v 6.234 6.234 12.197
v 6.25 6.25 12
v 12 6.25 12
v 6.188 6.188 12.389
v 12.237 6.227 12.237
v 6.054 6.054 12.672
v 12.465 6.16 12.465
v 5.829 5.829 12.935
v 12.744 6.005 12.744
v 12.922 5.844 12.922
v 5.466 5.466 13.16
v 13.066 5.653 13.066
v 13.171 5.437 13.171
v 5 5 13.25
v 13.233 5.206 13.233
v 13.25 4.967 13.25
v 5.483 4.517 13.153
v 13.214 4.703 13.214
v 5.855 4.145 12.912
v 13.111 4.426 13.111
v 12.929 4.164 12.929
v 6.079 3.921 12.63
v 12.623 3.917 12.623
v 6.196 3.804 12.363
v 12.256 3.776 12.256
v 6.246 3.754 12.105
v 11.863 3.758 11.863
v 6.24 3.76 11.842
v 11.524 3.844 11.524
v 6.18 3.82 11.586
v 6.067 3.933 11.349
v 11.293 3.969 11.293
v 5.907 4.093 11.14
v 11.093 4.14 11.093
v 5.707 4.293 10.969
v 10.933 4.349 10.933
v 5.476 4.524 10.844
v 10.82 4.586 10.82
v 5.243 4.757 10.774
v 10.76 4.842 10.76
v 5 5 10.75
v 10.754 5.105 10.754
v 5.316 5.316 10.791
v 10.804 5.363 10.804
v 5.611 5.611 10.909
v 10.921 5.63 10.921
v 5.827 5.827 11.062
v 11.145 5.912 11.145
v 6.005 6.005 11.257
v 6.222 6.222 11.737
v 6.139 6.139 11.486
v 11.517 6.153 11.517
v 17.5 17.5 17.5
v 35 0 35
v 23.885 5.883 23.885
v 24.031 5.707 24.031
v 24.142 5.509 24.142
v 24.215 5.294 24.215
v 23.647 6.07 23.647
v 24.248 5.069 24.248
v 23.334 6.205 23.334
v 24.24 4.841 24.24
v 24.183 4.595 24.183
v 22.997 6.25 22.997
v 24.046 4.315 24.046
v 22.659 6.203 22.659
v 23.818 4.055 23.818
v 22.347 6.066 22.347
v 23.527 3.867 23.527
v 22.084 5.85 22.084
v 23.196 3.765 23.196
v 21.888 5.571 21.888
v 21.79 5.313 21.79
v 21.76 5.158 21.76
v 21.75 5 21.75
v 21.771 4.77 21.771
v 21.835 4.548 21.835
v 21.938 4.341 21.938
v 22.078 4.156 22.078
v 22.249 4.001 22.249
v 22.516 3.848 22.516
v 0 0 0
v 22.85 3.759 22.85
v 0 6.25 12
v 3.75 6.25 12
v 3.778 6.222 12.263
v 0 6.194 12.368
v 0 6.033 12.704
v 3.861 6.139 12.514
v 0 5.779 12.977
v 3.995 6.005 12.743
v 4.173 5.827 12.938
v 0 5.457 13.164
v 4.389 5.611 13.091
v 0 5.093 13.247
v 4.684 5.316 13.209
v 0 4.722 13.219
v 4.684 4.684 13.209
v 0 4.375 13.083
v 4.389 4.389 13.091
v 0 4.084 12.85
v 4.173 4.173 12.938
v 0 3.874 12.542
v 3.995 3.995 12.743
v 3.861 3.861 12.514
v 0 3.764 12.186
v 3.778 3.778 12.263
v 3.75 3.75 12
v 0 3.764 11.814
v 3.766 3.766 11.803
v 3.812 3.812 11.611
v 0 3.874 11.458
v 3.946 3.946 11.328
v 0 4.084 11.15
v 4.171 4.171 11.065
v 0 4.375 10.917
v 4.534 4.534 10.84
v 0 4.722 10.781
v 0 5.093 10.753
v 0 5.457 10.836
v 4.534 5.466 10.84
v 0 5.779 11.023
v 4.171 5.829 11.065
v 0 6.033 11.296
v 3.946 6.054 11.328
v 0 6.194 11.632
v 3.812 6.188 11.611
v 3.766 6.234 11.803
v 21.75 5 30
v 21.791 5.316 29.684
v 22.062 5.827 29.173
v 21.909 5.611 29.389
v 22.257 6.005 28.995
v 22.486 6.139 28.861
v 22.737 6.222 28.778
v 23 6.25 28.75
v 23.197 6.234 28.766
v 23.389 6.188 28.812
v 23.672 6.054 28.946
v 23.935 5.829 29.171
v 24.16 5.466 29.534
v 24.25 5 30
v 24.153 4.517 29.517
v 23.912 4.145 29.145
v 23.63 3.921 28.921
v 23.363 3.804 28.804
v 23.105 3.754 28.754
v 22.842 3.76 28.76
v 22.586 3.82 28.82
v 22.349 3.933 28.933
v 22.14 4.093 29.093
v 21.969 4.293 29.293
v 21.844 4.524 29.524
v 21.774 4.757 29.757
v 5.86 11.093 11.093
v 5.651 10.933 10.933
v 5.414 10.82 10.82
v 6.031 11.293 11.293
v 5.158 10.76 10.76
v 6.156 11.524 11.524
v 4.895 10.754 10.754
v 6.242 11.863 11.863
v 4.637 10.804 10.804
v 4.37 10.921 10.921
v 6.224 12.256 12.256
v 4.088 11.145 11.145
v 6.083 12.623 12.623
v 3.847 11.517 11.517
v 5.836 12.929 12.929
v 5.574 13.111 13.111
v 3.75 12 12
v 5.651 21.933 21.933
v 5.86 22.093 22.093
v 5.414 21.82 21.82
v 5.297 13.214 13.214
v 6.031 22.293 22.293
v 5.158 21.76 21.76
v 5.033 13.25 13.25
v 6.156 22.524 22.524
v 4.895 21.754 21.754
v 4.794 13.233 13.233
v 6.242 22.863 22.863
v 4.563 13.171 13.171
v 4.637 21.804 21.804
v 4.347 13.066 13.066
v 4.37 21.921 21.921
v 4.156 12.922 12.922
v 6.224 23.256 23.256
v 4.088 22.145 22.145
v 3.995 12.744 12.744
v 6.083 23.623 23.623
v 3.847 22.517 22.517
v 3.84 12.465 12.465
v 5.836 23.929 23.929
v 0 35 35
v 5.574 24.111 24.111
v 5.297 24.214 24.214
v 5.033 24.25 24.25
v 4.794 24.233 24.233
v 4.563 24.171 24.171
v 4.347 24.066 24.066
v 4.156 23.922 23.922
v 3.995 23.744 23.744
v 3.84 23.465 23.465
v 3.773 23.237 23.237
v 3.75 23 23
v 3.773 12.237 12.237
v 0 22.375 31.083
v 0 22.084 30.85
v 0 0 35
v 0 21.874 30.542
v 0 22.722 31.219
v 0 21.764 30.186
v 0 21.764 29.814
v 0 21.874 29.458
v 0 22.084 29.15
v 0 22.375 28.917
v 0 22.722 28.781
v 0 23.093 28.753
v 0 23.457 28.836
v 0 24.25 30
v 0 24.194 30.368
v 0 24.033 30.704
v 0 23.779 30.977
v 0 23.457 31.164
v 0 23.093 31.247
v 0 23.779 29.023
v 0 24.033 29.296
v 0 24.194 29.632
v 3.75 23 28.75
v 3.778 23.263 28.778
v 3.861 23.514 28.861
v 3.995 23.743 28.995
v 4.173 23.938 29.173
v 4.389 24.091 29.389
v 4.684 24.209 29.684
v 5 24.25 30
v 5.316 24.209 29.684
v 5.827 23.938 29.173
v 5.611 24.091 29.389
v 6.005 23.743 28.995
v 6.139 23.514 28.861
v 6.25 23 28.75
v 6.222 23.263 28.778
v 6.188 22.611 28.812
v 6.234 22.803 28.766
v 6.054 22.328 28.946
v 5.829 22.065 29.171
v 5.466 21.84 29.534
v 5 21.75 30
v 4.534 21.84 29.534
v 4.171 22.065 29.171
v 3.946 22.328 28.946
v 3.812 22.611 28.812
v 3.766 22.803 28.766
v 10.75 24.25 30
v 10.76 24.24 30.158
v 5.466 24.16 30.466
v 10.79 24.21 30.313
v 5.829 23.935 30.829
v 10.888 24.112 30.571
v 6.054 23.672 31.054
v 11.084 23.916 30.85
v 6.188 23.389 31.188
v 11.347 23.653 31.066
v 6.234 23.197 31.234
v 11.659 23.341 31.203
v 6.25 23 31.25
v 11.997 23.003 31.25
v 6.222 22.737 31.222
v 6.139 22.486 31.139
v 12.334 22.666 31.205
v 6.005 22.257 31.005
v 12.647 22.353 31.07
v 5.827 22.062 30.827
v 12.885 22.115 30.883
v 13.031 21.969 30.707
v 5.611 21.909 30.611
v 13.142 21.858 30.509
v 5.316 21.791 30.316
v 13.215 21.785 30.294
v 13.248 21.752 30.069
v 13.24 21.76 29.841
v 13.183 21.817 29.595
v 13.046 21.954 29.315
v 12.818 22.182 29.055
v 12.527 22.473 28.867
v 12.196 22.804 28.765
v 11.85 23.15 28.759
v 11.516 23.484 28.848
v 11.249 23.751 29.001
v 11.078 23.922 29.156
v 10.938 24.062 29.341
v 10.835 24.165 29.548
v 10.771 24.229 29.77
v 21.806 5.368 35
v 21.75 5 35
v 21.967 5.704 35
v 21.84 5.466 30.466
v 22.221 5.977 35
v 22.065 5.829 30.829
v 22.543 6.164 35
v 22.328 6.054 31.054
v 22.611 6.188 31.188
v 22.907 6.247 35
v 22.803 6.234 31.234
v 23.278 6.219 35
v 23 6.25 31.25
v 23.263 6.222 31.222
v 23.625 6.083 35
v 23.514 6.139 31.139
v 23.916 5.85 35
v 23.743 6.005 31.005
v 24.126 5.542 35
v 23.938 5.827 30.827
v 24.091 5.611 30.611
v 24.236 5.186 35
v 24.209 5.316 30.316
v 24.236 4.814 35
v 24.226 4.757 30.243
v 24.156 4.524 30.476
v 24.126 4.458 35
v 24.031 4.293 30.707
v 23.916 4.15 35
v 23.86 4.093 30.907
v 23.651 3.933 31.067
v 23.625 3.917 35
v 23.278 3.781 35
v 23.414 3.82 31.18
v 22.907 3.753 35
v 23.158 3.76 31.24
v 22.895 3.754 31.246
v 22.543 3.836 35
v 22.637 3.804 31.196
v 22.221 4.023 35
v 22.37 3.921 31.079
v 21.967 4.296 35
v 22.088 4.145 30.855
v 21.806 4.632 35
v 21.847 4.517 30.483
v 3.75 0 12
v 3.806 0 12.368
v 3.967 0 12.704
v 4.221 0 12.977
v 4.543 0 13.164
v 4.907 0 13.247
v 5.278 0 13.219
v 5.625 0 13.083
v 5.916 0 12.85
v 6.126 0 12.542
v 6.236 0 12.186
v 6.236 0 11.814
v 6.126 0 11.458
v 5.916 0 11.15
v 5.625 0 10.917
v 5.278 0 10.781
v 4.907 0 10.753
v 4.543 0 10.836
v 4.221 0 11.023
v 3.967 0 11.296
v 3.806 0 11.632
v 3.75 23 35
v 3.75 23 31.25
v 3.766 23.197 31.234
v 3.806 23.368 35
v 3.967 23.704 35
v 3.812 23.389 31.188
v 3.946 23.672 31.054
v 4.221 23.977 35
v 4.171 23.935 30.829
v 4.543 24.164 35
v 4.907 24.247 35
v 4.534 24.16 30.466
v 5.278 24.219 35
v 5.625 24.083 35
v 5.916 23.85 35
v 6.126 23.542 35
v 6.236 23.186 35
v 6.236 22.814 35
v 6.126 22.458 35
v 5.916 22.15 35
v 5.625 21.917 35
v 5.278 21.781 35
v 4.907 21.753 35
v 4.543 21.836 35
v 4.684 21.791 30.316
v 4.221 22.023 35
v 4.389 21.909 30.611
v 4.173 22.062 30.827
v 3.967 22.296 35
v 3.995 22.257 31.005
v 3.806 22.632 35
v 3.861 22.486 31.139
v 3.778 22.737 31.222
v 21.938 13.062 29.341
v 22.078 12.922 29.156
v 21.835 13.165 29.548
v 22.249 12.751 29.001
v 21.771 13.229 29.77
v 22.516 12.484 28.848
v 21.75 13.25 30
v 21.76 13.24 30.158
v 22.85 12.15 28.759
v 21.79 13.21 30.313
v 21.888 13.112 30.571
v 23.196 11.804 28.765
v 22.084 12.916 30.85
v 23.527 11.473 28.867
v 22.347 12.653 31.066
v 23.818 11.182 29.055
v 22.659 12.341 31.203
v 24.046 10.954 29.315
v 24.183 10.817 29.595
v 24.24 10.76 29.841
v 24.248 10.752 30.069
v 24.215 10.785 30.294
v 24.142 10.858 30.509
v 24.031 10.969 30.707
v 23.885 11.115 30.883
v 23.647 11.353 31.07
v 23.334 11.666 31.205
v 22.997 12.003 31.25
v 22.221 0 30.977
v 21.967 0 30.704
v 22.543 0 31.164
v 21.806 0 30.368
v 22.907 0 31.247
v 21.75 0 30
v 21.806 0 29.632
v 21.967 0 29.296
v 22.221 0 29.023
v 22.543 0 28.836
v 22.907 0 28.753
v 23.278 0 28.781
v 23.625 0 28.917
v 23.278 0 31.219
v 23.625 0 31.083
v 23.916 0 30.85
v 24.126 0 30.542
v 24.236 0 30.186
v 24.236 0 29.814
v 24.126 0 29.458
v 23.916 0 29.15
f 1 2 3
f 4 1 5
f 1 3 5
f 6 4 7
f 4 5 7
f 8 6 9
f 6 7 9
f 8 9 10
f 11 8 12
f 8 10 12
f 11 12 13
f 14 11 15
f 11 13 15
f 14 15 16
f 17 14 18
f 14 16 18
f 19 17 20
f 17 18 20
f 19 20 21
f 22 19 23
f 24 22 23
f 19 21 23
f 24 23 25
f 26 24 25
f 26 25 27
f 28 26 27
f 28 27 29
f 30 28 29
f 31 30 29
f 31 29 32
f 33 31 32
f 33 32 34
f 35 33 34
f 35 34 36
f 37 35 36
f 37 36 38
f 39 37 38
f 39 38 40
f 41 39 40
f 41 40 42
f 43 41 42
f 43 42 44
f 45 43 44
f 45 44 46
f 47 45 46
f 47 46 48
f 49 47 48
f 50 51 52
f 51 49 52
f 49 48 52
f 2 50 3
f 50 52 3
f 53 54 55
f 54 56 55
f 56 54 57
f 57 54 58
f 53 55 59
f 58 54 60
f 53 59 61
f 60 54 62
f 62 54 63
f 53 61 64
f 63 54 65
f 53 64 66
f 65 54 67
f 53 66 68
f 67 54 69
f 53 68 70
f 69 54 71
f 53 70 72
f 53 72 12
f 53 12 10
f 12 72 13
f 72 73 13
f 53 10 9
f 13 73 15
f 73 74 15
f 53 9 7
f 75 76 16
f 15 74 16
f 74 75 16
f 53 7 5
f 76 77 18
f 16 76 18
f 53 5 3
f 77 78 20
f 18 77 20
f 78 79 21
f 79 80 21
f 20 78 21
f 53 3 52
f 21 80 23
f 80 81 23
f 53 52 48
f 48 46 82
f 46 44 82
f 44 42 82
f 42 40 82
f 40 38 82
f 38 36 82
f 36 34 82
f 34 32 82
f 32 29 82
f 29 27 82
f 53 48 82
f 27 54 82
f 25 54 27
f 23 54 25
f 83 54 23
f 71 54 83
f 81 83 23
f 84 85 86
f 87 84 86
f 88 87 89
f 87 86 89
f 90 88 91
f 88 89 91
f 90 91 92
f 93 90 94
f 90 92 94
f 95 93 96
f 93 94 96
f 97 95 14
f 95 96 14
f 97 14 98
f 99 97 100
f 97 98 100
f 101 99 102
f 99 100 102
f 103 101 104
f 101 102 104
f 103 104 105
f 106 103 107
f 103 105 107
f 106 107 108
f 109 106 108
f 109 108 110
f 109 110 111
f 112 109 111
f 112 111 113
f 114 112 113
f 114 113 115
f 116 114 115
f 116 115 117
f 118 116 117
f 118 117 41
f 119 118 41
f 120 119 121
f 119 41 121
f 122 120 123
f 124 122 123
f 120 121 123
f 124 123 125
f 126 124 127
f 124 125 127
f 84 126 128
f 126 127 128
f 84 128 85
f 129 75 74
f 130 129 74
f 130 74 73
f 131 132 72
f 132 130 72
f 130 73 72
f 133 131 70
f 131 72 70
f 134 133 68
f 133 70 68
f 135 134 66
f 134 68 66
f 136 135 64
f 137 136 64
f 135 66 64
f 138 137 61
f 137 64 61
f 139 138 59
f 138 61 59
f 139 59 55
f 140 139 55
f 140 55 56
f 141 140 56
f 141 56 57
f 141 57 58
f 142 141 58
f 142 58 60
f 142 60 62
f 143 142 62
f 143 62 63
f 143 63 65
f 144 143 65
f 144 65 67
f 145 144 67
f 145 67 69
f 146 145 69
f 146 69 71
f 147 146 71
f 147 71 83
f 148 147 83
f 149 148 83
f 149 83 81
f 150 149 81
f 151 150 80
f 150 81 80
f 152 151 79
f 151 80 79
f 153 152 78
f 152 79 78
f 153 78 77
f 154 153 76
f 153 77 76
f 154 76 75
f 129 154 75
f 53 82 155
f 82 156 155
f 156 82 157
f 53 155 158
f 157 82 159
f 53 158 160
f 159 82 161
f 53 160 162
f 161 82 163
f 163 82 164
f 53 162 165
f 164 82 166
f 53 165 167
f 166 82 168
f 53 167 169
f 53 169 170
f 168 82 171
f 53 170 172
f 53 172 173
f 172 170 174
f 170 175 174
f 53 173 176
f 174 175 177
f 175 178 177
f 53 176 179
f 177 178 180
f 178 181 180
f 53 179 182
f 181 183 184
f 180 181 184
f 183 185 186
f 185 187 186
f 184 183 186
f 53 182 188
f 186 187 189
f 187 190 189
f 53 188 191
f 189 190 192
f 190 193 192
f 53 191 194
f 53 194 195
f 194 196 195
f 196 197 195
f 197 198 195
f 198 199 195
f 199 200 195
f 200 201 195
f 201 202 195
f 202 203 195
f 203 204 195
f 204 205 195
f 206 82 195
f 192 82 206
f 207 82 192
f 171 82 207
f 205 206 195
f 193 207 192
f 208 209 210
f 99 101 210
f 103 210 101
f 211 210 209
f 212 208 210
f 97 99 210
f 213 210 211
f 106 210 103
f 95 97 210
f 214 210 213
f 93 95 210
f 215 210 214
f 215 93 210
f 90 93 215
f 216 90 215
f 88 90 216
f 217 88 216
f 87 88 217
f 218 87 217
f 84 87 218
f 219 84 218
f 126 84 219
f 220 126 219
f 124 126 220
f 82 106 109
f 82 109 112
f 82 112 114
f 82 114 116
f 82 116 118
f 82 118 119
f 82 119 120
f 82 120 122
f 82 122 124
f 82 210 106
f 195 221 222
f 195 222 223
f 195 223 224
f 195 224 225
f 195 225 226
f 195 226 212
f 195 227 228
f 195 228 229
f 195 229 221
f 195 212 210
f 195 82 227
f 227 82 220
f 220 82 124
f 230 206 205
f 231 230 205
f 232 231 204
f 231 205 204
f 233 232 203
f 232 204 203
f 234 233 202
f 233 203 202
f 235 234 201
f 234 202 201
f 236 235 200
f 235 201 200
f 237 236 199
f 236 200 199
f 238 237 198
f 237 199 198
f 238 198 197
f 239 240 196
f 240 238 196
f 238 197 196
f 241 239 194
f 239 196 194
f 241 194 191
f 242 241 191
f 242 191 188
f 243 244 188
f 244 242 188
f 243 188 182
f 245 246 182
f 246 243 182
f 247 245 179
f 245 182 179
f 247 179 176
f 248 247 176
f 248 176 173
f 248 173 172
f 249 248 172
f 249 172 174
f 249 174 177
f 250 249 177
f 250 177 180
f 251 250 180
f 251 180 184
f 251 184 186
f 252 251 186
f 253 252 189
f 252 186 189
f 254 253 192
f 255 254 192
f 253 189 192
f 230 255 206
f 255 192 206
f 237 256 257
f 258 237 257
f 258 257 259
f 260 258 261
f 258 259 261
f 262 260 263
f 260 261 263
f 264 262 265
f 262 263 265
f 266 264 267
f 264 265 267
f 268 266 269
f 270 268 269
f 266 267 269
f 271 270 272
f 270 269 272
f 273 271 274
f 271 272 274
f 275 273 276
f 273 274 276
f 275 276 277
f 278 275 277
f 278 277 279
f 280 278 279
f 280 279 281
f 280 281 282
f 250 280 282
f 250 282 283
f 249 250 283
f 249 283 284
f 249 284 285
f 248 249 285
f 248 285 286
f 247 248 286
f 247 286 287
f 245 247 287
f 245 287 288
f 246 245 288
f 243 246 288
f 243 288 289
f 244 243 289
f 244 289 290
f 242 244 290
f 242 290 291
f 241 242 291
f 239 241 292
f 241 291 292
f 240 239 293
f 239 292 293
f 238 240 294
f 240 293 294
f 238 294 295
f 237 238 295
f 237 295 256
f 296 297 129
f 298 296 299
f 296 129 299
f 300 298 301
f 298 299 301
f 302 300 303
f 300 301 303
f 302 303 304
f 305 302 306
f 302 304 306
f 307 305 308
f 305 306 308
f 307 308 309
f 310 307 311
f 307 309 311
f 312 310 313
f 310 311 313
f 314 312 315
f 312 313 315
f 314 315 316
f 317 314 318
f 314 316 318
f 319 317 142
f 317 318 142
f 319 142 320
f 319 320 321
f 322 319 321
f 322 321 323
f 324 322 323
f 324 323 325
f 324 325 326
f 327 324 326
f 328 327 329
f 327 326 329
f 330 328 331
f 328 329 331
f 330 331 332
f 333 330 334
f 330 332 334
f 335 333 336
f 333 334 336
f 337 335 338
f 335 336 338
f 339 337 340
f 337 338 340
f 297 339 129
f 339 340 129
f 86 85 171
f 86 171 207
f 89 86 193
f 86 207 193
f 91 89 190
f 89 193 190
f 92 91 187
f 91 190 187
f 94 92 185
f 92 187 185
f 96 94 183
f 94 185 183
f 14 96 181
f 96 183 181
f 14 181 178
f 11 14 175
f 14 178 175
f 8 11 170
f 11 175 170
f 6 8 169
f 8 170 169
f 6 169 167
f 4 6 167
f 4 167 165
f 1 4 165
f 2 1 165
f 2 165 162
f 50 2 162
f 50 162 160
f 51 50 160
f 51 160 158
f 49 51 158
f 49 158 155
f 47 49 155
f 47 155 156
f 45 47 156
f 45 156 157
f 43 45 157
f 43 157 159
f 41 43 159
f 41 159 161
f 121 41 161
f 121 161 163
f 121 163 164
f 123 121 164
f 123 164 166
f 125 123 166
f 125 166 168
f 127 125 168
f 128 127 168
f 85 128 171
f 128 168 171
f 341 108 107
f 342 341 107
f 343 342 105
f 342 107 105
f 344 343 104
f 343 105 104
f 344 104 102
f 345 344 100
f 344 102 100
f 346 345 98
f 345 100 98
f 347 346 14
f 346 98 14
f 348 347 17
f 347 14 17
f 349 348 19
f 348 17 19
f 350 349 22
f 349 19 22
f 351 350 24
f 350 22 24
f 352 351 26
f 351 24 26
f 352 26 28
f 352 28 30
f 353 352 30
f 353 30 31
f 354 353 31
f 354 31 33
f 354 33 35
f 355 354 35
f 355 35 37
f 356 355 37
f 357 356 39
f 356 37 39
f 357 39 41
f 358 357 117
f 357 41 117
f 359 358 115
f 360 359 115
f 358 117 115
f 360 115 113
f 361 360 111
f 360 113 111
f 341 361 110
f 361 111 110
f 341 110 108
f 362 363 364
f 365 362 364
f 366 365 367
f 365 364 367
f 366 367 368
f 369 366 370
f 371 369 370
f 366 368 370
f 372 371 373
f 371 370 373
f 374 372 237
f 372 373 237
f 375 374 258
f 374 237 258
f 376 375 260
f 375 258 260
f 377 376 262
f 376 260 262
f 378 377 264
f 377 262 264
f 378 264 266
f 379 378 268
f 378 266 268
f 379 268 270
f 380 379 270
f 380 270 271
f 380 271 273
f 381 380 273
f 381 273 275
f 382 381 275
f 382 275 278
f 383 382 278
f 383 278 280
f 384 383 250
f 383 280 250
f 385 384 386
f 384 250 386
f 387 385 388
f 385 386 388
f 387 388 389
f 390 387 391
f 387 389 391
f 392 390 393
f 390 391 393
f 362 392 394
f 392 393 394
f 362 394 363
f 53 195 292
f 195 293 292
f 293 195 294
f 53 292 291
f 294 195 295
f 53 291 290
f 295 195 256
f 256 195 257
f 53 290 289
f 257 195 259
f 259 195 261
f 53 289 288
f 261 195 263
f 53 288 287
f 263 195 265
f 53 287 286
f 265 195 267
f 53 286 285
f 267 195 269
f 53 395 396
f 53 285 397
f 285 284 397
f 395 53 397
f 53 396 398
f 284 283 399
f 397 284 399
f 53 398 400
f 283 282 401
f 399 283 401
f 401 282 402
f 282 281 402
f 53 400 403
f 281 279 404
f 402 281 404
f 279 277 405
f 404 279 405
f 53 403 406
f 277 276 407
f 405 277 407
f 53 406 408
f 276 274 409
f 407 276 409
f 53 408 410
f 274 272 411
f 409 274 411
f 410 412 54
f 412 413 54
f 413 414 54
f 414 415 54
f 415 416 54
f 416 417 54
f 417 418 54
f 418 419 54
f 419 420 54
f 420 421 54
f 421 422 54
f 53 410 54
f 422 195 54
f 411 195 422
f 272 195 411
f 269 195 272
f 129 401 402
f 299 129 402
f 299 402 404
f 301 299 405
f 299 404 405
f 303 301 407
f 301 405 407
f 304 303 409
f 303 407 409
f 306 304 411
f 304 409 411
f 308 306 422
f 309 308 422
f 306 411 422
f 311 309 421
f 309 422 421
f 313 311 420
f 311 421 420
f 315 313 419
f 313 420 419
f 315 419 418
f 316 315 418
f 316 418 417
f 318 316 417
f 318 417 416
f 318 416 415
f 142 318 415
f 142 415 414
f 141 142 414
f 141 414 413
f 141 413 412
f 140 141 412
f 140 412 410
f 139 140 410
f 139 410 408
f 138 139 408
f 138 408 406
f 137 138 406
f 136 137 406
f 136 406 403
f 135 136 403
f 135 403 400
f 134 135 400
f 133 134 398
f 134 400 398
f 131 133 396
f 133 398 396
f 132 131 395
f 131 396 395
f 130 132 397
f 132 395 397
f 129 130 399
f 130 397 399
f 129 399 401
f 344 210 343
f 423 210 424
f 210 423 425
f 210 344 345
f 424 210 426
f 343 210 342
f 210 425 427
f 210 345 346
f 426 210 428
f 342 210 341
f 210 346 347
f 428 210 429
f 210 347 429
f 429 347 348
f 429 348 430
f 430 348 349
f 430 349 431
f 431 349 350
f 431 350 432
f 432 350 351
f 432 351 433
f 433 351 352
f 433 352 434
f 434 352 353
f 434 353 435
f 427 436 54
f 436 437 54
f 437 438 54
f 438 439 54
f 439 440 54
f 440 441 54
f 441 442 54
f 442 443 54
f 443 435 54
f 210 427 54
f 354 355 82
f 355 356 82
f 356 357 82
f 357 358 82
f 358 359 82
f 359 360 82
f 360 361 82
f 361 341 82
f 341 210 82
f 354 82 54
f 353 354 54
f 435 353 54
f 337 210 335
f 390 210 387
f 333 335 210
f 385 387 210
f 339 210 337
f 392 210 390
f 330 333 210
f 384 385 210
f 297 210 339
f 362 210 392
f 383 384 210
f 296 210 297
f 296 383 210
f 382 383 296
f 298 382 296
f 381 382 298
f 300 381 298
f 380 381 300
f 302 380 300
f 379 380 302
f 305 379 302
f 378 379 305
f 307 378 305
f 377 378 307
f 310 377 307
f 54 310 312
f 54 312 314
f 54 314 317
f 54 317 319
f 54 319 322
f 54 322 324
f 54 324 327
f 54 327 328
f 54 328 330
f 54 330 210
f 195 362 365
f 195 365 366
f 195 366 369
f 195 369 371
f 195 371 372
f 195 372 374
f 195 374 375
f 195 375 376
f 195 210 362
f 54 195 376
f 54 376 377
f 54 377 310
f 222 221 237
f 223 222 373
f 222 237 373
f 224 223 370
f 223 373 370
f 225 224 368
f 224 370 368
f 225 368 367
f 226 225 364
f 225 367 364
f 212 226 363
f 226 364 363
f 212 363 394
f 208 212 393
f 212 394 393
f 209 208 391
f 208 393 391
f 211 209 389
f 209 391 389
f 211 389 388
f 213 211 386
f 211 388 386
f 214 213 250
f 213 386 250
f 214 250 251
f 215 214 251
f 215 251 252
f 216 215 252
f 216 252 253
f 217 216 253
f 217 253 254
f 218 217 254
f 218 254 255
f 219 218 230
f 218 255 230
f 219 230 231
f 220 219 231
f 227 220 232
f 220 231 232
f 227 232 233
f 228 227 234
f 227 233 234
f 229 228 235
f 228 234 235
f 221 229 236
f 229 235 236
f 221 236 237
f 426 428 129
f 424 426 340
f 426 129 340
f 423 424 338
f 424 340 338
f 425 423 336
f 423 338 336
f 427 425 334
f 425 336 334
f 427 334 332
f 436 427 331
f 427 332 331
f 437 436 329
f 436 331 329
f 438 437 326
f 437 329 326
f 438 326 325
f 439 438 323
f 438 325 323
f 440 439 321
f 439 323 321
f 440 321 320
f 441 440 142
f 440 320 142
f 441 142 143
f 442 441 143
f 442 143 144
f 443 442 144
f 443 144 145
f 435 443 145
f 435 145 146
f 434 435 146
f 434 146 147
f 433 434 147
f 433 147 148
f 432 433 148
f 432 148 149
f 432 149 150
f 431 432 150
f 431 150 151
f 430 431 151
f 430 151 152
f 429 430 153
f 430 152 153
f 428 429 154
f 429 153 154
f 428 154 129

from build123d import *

# Parameters (mm, degrees)
F0_W     = 35
F0_H     = 35
F1_DEPTH = 35
F3_DEPTH = 35.001
F5_DEPTH = 35.001
F7_DEPTH = 35.001
F9_D     = 2.5
F11_D    = 2.5
F13_D    = 2.5


with BuildPart() as f1:
    # F0 (on Top) → F1 (new body)
    with BuildSketch(Plane.XY):
        with Locations((17.5, 17.5)):
            Rectangle(F0_W, F0_H)
    extrude(amount=F1_DEPTH)

    # F2 (on face) → F3 (cut, through all)
    with BuildSketch(Plane.XY.offset(35)):
        Polygon((35, 35), (0, 35), (35, 0), align=None)
    extrude(amount=-F3_DEPTH, mode=Mode.SUBTRACT)

    # F4 (on face) → F5 (cut, through all)
    with BuildSketch(Plane.XZ):
        Polygon((35, 35), (0, 0), (35, 0), align=None)
    extrude(amount=-F5_DEPTH, mode=Mode.SUBTRACT)

    # F6 (on face) → F7 (cut, through all)
    with BuildSketch(Plane(origin=(0, 0, 0), x_dir=(0, -1, 0), z_dir=(-1, 0, 0))):
        Polygon((-35, 0), (0, 0), (-35, 35), align=None)
    extrude(amount=-F7_DEPTH, mode=Mode.SUBTRACT)

    # F9 (through all)
    with Locations(Plane.XZ):
        with Locations((23, 30), (5, 12)):
            Hole(F9_D / 2)

    # F11 (through all)
    with Locations(Plane(origin=(0, 0, 0), x_dir=(0, -1, 0), z_dir=(-1, 0, 0))):
        with Locations((-23, 30), (-5, 12)):
            Hole(F11_D / 2)

    # F13 (through all)
    with Locations(Plane.XY.offset(35)):
        with Locations((5, 23), (23, 5)):
            Hole(F13_D / 2)


solid = f1.part
